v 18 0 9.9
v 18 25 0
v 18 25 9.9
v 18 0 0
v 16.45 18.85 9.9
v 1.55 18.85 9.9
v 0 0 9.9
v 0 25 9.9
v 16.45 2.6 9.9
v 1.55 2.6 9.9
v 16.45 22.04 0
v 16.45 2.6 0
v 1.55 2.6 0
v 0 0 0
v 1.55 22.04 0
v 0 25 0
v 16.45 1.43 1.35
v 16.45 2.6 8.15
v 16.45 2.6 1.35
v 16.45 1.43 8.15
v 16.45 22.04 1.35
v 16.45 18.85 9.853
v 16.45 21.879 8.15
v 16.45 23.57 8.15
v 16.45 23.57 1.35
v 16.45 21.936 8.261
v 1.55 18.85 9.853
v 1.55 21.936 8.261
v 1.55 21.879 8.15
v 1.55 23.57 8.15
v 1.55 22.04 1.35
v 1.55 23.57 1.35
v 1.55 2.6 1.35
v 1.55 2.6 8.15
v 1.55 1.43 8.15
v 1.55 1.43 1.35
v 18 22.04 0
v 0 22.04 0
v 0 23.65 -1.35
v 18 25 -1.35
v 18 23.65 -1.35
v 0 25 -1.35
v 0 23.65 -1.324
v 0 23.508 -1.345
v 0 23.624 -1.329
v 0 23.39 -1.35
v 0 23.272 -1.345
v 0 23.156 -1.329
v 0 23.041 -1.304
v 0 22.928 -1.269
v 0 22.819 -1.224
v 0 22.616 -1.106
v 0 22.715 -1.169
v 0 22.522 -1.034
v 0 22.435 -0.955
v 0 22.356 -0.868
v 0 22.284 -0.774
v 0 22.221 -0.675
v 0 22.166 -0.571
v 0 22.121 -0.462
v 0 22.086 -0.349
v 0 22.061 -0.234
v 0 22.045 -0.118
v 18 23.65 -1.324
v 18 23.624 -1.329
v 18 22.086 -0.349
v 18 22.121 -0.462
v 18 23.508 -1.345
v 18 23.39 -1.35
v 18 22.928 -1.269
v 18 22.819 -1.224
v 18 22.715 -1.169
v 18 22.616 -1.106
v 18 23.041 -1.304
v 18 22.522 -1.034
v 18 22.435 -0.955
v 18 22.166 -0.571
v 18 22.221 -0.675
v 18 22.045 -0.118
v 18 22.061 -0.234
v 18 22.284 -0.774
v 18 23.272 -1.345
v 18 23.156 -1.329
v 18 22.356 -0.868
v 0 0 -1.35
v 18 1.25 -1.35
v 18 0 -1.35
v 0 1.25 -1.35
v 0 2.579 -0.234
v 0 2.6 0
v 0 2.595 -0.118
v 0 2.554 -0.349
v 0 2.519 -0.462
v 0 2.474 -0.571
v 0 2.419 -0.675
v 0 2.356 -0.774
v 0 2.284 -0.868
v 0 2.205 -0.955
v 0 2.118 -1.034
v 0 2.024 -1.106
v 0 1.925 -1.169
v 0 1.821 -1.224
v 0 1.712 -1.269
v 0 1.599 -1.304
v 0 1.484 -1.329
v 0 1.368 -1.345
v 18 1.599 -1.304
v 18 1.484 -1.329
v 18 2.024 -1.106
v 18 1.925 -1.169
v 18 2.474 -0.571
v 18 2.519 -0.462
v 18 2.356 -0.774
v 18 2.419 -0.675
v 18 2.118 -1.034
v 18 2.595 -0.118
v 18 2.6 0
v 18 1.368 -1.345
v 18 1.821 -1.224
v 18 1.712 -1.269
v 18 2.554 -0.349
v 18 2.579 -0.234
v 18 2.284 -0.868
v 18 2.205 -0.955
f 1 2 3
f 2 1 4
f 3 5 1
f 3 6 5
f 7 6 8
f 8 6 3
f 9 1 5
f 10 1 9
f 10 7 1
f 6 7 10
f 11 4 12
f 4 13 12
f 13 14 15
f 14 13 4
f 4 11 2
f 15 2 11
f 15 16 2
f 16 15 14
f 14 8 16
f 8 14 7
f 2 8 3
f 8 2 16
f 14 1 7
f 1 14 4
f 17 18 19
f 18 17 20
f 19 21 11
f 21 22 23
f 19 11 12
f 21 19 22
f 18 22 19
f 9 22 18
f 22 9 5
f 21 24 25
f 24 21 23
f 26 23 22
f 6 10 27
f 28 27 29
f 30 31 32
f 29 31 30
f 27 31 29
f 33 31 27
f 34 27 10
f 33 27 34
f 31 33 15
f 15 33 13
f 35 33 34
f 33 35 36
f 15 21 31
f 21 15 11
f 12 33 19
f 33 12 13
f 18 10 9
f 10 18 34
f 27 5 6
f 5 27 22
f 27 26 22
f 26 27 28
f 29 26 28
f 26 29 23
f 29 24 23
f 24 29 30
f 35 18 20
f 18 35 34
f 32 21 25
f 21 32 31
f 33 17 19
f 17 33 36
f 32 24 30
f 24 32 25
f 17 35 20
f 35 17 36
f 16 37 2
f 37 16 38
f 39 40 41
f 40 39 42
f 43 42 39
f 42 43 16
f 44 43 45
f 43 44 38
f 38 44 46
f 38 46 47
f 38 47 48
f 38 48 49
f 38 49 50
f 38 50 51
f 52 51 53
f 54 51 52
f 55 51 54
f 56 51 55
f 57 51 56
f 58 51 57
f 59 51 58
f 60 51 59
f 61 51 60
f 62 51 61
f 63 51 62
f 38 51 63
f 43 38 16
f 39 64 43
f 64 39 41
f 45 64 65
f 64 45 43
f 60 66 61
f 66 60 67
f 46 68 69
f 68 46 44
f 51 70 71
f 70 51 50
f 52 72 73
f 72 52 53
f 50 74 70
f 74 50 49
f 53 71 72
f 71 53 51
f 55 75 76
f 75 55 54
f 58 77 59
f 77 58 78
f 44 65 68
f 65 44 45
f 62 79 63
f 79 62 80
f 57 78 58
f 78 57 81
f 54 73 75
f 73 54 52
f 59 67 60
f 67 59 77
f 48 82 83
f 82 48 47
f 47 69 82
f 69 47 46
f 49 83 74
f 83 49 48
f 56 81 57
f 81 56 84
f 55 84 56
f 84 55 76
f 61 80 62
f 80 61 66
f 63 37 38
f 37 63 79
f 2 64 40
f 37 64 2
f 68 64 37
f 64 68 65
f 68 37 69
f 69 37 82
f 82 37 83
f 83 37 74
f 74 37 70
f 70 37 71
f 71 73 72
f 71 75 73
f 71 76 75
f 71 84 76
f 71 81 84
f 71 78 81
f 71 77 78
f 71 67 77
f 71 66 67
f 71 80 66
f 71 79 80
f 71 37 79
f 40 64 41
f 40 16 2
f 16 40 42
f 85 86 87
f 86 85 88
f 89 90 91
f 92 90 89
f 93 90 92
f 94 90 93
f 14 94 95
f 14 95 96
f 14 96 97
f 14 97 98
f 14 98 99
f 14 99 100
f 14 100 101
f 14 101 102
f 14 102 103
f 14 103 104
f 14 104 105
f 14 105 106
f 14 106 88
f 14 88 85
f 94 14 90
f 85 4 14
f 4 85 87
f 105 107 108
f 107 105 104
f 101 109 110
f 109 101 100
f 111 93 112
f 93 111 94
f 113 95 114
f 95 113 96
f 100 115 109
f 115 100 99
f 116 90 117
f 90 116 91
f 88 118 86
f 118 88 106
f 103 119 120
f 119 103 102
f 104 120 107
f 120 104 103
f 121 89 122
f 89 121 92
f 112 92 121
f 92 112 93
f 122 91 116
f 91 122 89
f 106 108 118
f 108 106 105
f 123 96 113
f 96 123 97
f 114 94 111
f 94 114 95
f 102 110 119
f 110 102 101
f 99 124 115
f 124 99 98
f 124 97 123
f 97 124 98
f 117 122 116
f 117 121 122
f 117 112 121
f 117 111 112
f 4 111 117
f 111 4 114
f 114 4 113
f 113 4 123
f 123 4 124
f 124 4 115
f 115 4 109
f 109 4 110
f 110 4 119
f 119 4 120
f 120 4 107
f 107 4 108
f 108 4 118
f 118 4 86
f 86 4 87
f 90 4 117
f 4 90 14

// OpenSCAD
$fa = 5;
$fs = 0.01;

/*
 * The RJ45 keystone receiver
 */
module rj45Receiver() {
	difference() {
		cube([18, 25, 9.9]);
		translate([1.55, 2.6, 0]) {
			cube([14.9, 19.44, 7.9]);
		}
		translate([1.55, 2.6, 7.9]) {
		#	cube([14.9, 16.25, 2]);
		}
		translate([1.55, 17.45, 7.2]) {
			rotate(v=[1, 0, 0], a=-27.3) {
				cube([14.9, 3.5, 3]);
			}
		}
		translate([1.55, 1.43, 1.35]) {
			cube([14.9, 22.14, 6.8]);
		}
	}
	translate([0, 22.04, -1.35]) {
		intersection() {
			cube([18, 2.96, 1.35]);
			union() {
				translate([0, 1.61, 0]) {
					cube([20.42, 1.61, 1.35]);
				}
				translate([0, 1.35, 1.35]) {
					rotate(v=[0, 1, 0], a=90) {
						cylinder(h=20.42, r=1.35);
					}
				}
			}
		}
	}

	translate([0, 0, -1.35]) {
		intersection() {
			cube([18, 2.6, 1.35]);
			union() {
				cube([20.42, 1.25, 1.35]);
				translate([0, 1.25, 1.35]) {
					rotate(v=[0, 1, 0], a=90) {
						cylinder(h=20.42, r=1.35);
					}
				}
			}
		}
	}
}

/*
 * So a hole can be cut for the keystone socket
 */
module rj45VolumeBlock() {
	cube([18, 25, 9.9]);
}

rj45Receiver();
